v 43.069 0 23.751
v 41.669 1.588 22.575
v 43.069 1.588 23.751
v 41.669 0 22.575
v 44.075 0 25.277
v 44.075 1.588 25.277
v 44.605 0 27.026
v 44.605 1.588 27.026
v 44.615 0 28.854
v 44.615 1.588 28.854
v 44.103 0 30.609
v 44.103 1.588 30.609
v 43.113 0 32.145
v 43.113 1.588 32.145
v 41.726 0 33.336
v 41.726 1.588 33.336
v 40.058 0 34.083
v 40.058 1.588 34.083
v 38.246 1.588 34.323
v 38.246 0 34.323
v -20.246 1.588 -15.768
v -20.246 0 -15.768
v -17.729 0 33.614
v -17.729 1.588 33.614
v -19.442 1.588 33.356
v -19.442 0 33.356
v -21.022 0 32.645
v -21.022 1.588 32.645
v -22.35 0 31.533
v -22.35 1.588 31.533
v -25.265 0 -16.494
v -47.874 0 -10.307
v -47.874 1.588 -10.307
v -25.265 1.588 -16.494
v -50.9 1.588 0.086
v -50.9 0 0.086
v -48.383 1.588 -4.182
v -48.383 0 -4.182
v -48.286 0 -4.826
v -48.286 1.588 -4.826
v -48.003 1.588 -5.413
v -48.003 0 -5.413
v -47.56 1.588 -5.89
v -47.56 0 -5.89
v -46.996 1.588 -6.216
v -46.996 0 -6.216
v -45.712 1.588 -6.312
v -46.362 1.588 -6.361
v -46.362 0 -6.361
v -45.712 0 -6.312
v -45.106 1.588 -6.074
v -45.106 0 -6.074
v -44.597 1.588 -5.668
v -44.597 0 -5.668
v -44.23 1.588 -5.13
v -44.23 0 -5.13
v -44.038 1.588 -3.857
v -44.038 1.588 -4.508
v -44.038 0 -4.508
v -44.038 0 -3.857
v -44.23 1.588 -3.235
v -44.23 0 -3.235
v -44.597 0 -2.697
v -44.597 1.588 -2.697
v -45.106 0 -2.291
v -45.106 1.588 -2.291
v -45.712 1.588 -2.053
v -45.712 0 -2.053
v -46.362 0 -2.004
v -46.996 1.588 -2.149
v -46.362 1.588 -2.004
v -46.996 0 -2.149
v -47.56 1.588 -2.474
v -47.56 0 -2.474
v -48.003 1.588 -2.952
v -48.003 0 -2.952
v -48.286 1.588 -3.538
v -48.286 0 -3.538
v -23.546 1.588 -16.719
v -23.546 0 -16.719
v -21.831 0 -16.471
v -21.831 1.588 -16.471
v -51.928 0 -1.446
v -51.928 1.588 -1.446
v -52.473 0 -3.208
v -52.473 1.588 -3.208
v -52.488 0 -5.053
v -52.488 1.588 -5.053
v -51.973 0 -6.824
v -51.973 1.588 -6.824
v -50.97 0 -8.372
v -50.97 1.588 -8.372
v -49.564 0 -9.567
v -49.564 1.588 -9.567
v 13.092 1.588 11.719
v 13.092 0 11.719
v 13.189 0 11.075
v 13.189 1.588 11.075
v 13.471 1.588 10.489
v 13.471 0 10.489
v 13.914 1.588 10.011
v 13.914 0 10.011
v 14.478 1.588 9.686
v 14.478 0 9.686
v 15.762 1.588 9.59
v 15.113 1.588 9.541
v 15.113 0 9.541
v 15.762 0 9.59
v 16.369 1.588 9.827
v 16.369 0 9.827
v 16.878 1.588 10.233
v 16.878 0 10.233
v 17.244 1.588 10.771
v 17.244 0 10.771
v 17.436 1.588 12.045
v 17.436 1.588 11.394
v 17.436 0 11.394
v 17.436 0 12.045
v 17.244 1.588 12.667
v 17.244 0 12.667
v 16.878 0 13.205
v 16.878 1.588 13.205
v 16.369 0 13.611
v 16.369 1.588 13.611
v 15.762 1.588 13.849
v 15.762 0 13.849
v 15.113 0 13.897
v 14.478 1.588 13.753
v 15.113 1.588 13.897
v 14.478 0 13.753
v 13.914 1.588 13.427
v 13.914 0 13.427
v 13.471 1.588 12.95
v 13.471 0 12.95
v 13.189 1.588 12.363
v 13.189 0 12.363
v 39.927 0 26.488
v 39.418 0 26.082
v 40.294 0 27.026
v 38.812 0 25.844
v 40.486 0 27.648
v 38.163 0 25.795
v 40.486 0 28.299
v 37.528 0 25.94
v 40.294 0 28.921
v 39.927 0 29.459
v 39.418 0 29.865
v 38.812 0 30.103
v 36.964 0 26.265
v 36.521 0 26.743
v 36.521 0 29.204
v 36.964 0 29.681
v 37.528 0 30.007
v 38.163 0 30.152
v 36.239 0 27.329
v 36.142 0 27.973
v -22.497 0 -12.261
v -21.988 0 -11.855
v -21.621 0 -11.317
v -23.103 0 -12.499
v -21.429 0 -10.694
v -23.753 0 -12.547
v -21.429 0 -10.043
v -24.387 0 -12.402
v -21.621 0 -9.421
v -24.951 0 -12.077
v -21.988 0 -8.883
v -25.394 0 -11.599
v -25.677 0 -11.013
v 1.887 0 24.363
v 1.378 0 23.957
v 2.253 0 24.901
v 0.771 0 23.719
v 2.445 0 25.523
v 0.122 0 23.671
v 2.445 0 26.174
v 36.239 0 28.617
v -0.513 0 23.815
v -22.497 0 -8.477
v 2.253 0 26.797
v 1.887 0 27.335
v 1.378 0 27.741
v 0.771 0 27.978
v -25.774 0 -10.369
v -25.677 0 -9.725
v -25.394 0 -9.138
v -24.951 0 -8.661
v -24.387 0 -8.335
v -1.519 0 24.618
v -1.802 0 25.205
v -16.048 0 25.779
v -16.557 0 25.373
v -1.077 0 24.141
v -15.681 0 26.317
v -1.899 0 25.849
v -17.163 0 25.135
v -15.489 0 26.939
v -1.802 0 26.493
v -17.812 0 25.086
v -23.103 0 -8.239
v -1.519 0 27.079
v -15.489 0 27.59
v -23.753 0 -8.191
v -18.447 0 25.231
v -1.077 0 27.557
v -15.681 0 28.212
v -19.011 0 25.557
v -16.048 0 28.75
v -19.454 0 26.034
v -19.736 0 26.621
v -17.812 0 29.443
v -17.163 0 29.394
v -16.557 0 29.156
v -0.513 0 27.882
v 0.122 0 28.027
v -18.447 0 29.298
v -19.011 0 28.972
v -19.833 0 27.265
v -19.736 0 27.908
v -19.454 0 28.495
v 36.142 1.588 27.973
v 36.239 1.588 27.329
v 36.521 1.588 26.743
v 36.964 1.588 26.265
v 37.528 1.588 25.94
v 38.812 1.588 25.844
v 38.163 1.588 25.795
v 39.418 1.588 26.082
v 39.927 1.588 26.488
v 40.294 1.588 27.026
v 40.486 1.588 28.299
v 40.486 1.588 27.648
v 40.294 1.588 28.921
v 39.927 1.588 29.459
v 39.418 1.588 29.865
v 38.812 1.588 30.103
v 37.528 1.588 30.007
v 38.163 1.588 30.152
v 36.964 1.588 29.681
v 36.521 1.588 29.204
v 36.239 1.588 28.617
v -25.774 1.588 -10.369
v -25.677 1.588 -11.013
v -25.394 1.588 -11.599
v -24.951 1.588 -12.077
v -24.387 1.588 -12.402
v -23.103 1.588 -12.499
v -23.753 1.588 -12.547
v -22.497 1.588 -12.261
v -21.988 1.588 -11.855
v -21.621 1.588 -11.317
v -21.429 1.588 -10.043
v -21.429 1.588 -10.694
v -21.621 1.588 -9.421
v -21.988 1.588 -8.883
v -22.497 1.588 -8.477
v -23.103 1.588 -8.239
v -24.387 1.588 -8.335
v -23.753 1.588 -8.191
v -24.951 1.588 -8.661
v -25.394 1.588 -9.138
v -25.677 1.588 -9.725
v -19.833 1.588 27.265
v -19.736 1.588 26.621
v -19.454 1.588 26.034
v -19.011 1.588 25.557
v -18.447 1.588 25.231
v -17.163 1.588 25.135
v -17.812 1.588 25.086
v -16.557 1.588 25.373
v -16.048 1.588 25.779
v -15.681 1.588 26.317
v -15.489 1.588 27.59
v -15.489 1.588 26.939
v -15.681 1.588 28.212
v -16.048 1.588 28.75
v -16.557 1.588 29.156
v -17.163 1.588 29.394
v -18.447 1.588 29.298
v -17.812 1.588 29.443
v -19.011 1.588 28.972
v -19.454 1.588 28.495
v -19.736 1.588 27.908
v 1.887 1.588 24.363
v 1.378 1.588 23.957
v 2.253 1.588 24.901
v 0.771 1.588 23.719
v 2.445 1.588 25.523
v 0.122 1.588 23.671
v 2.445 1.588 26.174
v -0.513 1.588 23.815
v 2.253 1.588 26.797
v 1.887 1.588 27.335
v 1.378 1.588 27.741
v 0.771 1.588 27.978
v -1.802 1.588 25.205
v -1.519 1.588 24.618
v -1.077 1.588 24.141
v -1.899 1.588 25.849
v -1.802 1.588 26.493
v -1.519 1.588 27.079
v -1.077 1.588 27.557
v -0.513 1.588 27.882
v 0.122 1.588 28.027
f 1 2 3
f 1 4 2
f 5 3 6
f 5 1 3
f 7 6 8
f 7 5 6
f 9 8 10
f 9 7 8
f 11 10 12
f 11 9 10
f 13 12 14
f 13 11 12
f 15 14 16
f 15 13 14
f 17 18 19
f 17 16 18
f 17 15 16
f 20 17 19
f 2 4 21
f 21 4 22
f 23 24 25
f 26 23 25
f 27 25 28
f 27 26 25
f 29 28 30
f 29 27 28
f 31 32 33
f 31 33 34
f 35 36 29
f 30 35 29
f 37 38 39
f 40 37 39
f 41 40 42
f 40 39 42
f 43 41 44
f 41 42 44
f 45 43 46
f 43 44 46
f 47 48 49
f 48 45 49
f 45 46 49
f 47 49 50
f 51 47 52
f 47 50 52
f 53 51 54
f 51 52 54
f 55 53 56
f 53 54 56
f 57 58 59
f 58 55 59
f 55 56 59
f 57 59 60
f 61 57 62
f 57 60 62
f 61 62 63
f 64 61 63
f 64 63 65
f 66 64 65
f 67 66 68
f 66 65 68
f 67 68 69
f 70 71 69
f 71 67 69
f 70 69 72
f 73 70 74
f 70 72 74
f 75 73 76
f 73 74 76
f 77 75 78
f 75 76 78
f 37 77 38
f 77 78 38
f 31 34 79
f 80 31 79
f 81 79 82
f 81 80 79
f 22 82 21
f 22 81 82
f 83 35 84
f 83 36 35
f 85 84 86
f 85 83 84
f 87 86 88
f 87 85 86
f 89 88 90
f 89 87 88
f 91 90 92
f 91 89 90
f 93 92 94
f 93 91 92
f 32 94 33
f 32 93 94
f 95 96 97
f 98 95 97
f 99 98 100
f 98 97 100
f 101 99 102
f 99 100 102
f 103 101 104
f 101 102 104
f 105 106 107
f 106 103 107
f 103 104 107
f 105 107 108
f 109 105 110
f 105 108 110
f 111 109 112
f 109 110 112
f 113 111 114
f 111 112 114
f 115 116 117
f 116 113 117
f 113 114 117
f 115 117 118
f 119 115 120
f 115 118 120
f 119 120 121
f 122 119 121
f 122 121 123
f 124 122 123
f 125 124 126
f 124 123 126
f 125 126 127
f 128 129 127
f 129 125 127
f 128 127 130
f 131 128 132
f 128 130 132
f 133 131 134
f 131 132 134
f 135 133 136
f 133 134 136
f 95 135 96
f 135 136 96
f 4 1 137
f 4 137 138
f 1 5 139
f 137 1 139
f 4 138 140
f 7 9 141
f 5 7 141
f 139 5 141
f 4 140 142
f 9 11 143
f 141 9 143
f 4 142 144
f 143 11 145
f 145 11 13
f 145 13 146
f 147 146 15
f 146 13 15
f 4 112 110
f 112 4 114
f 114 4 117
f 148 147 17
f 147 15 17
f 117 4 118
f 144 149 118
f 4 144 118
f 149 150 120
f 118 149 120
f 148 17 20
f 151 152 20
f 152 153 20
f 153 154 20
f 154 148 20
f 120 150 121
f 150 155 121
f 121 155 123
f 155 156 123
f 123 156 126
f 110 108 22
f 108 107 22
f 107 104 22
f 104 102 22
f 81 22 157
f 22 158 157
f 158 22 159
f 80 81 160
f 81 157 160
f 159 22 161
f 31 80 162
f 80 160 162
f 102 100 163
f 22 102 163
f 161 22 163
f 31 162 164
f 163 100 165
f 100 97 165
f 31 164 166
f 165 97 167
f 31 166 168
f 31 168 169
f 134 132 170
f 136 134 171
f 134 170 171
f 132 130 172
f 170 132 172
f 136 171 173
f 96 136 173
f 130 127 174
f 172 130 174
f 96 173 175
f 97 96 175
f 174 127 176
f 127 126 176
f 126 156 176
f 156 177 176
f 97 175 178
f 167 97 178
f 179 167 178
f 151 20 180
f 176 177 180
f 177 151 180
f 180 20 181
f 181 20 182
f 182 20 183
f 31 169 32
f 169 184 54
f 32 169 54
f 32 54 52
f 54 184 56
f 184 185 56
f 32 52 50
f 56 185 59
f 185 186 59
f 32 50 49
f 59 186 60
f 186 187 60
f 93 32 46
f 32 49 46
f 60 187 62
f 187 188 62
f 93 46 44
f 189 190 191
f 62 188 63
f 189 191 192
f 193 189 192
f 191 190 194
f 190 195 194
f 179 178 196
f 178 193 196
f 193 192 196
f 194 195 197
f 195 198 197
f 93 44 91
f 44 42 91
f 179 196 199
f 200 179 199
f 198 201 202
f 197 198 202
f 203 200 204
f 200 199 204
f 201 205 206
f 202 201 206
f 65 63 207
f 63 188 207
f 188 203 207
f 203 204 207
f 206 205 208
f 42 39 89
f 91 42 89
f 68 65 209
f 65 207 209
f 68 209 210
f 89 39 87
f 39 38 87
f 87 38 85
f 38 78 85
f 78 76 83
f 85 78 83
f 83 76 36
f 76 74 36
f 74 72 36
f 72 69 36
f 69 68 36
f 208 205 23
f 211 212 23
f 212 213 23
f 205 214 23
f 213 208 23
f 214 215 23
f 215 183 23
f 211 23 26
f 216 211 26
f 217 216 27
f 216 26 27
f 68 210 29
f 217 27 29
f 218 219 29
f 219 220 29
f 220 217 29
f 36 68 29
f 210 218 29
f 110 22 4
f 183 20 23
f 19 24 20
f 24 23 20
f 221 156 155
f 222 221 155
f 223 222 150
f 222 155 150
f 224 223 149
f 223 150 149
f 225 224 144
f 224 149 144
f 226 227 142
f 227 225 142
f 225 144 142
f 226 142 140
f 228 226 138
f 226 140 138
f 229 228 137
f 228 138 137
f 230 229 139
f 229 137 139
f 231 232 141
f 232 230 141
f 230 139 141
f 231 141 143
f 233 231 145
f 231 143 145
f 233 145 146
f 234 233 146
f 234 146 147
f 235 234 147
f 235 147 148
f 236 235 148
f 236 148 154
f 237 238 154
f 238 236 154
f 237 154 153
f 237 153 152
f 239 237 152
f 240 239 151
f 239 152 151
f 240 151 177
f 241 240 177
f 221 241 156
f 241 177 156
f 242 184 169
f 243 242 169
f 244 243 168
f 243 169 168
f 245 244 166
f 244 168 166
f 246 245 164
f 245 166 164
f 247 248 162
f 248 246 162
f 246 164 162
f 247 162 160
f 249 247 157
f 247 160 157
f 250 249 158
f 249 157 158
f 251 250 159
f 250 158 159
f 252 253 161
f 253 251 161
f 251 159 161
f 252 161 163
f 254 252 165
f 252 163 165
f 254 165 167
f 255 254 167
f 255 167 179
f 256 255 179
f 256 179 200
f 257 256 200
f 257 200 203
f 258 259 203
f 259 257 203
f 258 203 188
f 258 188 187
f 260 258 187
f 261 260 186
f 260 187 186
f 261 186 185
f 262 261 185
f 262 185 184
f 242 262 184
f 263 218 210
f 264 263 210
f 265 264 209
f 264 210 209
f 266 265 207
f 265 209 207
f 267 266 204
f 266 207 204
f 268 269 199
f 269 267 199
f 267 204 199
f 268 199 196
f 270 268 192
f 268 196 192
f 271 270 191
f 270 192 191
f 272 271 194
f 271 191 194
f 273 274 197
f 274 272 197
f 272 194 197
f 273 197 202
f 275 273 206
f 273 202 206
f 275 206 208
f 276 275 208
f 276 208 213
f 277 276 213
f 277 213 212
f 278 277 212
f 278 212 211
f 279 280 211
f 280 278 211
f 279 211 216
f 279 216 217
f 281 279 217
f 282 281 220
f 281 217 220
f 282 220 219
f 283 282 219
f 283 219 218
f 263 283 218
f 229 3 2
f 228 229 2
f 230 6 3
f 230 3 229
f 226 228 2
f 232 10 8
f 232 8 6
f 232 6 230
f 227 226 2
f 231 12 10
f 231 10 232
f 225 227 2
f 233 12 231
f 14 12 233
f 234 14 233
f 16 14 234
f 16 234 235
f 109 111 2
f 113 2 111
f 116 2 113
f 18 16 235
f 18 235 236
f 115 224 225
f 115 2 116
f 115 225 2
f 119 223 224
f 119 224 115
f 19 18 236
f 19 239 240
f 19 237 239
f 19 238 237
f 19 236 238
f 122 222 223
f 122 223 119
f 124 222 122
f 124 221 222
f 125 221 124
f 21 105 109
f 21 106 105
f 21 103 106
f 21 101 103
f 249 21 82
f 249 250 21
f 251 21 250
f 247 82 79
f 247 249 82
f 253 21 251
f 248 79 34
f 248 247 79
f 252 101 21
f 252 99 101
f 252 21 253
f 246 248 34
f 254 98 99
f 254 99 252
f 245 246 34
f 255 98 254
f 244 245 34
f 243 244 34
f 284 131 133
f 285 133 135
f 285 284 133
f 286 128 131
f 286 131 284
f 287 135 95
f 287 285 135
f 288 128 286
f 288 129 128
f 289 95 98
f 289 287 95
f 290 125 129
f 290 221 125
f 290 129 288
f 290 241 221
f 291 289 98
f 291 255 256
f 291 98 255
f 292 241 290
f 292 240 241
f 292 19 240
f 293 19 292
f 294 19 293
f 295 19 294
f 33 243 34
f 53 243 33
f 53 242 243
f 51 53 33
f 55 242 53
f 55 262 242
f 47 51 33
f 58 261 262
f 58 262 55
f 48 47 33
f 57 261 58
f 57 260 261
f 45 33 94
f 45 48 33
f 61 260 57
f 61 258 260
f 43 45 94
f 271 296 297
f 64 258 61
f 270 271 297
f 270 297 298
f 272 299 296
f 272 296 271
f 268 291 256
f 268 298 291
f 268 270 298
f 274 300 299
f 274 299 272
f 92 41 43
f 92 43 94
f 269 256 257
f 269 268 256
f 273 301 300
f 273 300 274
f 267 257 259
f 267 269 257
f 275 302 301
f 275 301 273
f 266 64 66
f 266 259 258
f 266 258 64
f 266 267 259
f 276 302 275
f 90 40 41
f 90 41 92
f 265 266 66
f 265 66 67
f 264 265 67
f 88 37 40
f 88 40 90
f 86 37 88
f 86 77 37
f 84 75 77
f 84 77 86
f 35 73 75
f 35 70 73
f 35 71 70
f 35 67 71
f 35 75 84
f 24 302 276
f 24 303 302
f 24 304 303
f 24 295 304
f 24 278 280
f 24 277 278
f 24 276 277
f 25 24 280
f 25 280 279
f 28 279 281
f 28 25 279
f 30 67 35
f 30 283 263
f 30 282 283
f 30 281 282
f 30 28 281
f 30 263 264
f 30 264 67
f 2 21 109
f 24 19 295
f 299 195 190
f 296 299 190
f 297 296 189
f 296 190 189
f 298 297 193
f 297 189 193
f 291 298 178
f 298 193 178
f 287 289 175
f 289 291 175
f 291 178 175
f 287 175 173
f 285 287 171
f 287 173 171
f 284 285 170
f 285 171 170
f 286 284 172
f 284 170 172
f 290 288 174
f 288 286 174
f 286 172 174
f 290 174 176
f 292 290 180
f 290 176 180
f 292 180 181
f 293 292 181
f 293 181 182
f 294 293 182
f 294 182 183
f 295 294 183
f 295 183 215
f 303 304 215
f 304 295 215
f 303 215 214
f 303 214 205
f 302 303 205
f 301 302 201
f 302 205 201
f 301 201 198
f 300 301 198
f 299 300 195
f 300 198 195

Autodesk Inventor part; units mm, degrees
ref_plane "YZ Plane" through (0, 0, 0) normal (1, 0, 0) x (0, 1, 0)
ref_plane "XZ Plane" through (0, 0, 0) normal (0, 1, 0) x (-1, 0, 0)
ref_plane "XY Plane" through (0, 0, 0) normal (0, 0, 1) x (1, 0, 0)
sketch "Sketch1" plane through (0, 0, 0) normal (0, 1, 0) x (-1, 0, 0)
  circle A0 centre (-15.2763, 11.7192) radius 2.1844
  circle A1 centre (46.1983, -4.1823) radius 2.1844
  circle A2 centre (-0.2854, 25.8488) radius 2.1844
  circle A3 centre (17.6488, 27.2646) radius 2.1844
  circle A4 centre (23.5893, -10.3689) radius 2.1844
  circle A5 centre (-38.3261, 27.9733) radius 2.1844
  arc A6 (-38.2458, 34.3228) -> (-41.6694, 22.5746) centre (-38.3261, 27.9733) ccw
  arc A7 (20.246, -15.7676) -> (25.2652, -16.4937) centre (23.5893, -10.3689) ccw
  line L0 (-41.6694, 22.5746) -> (20.246, -15.7676)
  arc A8 (22.3503, 31.5329) -> (17.7292, 33.6141) centre (17.6488, 27.2646) ccw
  line L1 (17.7292, 33.6141) -> (-38.2458, 34.3228)
  arc A9 (47.8742, -10.3072) -> (50.8998, 0.086) centre (46.1983, -4.1823) ccw
  line L2 (50.8998, 0.086) -> (22.3503, 31.5329)
  line L3 (47.8742, -10.3072) -> (25.2652, -16.4937)
  point P0 (0, 0)
  point P1 (21.7554, 32.108)
  point P2 (24.1332, -16.6956)
extrude "Extrusion1" add sketch "Sketch1" along normal blind 1.5875
properties part number "newsidepolytest"
